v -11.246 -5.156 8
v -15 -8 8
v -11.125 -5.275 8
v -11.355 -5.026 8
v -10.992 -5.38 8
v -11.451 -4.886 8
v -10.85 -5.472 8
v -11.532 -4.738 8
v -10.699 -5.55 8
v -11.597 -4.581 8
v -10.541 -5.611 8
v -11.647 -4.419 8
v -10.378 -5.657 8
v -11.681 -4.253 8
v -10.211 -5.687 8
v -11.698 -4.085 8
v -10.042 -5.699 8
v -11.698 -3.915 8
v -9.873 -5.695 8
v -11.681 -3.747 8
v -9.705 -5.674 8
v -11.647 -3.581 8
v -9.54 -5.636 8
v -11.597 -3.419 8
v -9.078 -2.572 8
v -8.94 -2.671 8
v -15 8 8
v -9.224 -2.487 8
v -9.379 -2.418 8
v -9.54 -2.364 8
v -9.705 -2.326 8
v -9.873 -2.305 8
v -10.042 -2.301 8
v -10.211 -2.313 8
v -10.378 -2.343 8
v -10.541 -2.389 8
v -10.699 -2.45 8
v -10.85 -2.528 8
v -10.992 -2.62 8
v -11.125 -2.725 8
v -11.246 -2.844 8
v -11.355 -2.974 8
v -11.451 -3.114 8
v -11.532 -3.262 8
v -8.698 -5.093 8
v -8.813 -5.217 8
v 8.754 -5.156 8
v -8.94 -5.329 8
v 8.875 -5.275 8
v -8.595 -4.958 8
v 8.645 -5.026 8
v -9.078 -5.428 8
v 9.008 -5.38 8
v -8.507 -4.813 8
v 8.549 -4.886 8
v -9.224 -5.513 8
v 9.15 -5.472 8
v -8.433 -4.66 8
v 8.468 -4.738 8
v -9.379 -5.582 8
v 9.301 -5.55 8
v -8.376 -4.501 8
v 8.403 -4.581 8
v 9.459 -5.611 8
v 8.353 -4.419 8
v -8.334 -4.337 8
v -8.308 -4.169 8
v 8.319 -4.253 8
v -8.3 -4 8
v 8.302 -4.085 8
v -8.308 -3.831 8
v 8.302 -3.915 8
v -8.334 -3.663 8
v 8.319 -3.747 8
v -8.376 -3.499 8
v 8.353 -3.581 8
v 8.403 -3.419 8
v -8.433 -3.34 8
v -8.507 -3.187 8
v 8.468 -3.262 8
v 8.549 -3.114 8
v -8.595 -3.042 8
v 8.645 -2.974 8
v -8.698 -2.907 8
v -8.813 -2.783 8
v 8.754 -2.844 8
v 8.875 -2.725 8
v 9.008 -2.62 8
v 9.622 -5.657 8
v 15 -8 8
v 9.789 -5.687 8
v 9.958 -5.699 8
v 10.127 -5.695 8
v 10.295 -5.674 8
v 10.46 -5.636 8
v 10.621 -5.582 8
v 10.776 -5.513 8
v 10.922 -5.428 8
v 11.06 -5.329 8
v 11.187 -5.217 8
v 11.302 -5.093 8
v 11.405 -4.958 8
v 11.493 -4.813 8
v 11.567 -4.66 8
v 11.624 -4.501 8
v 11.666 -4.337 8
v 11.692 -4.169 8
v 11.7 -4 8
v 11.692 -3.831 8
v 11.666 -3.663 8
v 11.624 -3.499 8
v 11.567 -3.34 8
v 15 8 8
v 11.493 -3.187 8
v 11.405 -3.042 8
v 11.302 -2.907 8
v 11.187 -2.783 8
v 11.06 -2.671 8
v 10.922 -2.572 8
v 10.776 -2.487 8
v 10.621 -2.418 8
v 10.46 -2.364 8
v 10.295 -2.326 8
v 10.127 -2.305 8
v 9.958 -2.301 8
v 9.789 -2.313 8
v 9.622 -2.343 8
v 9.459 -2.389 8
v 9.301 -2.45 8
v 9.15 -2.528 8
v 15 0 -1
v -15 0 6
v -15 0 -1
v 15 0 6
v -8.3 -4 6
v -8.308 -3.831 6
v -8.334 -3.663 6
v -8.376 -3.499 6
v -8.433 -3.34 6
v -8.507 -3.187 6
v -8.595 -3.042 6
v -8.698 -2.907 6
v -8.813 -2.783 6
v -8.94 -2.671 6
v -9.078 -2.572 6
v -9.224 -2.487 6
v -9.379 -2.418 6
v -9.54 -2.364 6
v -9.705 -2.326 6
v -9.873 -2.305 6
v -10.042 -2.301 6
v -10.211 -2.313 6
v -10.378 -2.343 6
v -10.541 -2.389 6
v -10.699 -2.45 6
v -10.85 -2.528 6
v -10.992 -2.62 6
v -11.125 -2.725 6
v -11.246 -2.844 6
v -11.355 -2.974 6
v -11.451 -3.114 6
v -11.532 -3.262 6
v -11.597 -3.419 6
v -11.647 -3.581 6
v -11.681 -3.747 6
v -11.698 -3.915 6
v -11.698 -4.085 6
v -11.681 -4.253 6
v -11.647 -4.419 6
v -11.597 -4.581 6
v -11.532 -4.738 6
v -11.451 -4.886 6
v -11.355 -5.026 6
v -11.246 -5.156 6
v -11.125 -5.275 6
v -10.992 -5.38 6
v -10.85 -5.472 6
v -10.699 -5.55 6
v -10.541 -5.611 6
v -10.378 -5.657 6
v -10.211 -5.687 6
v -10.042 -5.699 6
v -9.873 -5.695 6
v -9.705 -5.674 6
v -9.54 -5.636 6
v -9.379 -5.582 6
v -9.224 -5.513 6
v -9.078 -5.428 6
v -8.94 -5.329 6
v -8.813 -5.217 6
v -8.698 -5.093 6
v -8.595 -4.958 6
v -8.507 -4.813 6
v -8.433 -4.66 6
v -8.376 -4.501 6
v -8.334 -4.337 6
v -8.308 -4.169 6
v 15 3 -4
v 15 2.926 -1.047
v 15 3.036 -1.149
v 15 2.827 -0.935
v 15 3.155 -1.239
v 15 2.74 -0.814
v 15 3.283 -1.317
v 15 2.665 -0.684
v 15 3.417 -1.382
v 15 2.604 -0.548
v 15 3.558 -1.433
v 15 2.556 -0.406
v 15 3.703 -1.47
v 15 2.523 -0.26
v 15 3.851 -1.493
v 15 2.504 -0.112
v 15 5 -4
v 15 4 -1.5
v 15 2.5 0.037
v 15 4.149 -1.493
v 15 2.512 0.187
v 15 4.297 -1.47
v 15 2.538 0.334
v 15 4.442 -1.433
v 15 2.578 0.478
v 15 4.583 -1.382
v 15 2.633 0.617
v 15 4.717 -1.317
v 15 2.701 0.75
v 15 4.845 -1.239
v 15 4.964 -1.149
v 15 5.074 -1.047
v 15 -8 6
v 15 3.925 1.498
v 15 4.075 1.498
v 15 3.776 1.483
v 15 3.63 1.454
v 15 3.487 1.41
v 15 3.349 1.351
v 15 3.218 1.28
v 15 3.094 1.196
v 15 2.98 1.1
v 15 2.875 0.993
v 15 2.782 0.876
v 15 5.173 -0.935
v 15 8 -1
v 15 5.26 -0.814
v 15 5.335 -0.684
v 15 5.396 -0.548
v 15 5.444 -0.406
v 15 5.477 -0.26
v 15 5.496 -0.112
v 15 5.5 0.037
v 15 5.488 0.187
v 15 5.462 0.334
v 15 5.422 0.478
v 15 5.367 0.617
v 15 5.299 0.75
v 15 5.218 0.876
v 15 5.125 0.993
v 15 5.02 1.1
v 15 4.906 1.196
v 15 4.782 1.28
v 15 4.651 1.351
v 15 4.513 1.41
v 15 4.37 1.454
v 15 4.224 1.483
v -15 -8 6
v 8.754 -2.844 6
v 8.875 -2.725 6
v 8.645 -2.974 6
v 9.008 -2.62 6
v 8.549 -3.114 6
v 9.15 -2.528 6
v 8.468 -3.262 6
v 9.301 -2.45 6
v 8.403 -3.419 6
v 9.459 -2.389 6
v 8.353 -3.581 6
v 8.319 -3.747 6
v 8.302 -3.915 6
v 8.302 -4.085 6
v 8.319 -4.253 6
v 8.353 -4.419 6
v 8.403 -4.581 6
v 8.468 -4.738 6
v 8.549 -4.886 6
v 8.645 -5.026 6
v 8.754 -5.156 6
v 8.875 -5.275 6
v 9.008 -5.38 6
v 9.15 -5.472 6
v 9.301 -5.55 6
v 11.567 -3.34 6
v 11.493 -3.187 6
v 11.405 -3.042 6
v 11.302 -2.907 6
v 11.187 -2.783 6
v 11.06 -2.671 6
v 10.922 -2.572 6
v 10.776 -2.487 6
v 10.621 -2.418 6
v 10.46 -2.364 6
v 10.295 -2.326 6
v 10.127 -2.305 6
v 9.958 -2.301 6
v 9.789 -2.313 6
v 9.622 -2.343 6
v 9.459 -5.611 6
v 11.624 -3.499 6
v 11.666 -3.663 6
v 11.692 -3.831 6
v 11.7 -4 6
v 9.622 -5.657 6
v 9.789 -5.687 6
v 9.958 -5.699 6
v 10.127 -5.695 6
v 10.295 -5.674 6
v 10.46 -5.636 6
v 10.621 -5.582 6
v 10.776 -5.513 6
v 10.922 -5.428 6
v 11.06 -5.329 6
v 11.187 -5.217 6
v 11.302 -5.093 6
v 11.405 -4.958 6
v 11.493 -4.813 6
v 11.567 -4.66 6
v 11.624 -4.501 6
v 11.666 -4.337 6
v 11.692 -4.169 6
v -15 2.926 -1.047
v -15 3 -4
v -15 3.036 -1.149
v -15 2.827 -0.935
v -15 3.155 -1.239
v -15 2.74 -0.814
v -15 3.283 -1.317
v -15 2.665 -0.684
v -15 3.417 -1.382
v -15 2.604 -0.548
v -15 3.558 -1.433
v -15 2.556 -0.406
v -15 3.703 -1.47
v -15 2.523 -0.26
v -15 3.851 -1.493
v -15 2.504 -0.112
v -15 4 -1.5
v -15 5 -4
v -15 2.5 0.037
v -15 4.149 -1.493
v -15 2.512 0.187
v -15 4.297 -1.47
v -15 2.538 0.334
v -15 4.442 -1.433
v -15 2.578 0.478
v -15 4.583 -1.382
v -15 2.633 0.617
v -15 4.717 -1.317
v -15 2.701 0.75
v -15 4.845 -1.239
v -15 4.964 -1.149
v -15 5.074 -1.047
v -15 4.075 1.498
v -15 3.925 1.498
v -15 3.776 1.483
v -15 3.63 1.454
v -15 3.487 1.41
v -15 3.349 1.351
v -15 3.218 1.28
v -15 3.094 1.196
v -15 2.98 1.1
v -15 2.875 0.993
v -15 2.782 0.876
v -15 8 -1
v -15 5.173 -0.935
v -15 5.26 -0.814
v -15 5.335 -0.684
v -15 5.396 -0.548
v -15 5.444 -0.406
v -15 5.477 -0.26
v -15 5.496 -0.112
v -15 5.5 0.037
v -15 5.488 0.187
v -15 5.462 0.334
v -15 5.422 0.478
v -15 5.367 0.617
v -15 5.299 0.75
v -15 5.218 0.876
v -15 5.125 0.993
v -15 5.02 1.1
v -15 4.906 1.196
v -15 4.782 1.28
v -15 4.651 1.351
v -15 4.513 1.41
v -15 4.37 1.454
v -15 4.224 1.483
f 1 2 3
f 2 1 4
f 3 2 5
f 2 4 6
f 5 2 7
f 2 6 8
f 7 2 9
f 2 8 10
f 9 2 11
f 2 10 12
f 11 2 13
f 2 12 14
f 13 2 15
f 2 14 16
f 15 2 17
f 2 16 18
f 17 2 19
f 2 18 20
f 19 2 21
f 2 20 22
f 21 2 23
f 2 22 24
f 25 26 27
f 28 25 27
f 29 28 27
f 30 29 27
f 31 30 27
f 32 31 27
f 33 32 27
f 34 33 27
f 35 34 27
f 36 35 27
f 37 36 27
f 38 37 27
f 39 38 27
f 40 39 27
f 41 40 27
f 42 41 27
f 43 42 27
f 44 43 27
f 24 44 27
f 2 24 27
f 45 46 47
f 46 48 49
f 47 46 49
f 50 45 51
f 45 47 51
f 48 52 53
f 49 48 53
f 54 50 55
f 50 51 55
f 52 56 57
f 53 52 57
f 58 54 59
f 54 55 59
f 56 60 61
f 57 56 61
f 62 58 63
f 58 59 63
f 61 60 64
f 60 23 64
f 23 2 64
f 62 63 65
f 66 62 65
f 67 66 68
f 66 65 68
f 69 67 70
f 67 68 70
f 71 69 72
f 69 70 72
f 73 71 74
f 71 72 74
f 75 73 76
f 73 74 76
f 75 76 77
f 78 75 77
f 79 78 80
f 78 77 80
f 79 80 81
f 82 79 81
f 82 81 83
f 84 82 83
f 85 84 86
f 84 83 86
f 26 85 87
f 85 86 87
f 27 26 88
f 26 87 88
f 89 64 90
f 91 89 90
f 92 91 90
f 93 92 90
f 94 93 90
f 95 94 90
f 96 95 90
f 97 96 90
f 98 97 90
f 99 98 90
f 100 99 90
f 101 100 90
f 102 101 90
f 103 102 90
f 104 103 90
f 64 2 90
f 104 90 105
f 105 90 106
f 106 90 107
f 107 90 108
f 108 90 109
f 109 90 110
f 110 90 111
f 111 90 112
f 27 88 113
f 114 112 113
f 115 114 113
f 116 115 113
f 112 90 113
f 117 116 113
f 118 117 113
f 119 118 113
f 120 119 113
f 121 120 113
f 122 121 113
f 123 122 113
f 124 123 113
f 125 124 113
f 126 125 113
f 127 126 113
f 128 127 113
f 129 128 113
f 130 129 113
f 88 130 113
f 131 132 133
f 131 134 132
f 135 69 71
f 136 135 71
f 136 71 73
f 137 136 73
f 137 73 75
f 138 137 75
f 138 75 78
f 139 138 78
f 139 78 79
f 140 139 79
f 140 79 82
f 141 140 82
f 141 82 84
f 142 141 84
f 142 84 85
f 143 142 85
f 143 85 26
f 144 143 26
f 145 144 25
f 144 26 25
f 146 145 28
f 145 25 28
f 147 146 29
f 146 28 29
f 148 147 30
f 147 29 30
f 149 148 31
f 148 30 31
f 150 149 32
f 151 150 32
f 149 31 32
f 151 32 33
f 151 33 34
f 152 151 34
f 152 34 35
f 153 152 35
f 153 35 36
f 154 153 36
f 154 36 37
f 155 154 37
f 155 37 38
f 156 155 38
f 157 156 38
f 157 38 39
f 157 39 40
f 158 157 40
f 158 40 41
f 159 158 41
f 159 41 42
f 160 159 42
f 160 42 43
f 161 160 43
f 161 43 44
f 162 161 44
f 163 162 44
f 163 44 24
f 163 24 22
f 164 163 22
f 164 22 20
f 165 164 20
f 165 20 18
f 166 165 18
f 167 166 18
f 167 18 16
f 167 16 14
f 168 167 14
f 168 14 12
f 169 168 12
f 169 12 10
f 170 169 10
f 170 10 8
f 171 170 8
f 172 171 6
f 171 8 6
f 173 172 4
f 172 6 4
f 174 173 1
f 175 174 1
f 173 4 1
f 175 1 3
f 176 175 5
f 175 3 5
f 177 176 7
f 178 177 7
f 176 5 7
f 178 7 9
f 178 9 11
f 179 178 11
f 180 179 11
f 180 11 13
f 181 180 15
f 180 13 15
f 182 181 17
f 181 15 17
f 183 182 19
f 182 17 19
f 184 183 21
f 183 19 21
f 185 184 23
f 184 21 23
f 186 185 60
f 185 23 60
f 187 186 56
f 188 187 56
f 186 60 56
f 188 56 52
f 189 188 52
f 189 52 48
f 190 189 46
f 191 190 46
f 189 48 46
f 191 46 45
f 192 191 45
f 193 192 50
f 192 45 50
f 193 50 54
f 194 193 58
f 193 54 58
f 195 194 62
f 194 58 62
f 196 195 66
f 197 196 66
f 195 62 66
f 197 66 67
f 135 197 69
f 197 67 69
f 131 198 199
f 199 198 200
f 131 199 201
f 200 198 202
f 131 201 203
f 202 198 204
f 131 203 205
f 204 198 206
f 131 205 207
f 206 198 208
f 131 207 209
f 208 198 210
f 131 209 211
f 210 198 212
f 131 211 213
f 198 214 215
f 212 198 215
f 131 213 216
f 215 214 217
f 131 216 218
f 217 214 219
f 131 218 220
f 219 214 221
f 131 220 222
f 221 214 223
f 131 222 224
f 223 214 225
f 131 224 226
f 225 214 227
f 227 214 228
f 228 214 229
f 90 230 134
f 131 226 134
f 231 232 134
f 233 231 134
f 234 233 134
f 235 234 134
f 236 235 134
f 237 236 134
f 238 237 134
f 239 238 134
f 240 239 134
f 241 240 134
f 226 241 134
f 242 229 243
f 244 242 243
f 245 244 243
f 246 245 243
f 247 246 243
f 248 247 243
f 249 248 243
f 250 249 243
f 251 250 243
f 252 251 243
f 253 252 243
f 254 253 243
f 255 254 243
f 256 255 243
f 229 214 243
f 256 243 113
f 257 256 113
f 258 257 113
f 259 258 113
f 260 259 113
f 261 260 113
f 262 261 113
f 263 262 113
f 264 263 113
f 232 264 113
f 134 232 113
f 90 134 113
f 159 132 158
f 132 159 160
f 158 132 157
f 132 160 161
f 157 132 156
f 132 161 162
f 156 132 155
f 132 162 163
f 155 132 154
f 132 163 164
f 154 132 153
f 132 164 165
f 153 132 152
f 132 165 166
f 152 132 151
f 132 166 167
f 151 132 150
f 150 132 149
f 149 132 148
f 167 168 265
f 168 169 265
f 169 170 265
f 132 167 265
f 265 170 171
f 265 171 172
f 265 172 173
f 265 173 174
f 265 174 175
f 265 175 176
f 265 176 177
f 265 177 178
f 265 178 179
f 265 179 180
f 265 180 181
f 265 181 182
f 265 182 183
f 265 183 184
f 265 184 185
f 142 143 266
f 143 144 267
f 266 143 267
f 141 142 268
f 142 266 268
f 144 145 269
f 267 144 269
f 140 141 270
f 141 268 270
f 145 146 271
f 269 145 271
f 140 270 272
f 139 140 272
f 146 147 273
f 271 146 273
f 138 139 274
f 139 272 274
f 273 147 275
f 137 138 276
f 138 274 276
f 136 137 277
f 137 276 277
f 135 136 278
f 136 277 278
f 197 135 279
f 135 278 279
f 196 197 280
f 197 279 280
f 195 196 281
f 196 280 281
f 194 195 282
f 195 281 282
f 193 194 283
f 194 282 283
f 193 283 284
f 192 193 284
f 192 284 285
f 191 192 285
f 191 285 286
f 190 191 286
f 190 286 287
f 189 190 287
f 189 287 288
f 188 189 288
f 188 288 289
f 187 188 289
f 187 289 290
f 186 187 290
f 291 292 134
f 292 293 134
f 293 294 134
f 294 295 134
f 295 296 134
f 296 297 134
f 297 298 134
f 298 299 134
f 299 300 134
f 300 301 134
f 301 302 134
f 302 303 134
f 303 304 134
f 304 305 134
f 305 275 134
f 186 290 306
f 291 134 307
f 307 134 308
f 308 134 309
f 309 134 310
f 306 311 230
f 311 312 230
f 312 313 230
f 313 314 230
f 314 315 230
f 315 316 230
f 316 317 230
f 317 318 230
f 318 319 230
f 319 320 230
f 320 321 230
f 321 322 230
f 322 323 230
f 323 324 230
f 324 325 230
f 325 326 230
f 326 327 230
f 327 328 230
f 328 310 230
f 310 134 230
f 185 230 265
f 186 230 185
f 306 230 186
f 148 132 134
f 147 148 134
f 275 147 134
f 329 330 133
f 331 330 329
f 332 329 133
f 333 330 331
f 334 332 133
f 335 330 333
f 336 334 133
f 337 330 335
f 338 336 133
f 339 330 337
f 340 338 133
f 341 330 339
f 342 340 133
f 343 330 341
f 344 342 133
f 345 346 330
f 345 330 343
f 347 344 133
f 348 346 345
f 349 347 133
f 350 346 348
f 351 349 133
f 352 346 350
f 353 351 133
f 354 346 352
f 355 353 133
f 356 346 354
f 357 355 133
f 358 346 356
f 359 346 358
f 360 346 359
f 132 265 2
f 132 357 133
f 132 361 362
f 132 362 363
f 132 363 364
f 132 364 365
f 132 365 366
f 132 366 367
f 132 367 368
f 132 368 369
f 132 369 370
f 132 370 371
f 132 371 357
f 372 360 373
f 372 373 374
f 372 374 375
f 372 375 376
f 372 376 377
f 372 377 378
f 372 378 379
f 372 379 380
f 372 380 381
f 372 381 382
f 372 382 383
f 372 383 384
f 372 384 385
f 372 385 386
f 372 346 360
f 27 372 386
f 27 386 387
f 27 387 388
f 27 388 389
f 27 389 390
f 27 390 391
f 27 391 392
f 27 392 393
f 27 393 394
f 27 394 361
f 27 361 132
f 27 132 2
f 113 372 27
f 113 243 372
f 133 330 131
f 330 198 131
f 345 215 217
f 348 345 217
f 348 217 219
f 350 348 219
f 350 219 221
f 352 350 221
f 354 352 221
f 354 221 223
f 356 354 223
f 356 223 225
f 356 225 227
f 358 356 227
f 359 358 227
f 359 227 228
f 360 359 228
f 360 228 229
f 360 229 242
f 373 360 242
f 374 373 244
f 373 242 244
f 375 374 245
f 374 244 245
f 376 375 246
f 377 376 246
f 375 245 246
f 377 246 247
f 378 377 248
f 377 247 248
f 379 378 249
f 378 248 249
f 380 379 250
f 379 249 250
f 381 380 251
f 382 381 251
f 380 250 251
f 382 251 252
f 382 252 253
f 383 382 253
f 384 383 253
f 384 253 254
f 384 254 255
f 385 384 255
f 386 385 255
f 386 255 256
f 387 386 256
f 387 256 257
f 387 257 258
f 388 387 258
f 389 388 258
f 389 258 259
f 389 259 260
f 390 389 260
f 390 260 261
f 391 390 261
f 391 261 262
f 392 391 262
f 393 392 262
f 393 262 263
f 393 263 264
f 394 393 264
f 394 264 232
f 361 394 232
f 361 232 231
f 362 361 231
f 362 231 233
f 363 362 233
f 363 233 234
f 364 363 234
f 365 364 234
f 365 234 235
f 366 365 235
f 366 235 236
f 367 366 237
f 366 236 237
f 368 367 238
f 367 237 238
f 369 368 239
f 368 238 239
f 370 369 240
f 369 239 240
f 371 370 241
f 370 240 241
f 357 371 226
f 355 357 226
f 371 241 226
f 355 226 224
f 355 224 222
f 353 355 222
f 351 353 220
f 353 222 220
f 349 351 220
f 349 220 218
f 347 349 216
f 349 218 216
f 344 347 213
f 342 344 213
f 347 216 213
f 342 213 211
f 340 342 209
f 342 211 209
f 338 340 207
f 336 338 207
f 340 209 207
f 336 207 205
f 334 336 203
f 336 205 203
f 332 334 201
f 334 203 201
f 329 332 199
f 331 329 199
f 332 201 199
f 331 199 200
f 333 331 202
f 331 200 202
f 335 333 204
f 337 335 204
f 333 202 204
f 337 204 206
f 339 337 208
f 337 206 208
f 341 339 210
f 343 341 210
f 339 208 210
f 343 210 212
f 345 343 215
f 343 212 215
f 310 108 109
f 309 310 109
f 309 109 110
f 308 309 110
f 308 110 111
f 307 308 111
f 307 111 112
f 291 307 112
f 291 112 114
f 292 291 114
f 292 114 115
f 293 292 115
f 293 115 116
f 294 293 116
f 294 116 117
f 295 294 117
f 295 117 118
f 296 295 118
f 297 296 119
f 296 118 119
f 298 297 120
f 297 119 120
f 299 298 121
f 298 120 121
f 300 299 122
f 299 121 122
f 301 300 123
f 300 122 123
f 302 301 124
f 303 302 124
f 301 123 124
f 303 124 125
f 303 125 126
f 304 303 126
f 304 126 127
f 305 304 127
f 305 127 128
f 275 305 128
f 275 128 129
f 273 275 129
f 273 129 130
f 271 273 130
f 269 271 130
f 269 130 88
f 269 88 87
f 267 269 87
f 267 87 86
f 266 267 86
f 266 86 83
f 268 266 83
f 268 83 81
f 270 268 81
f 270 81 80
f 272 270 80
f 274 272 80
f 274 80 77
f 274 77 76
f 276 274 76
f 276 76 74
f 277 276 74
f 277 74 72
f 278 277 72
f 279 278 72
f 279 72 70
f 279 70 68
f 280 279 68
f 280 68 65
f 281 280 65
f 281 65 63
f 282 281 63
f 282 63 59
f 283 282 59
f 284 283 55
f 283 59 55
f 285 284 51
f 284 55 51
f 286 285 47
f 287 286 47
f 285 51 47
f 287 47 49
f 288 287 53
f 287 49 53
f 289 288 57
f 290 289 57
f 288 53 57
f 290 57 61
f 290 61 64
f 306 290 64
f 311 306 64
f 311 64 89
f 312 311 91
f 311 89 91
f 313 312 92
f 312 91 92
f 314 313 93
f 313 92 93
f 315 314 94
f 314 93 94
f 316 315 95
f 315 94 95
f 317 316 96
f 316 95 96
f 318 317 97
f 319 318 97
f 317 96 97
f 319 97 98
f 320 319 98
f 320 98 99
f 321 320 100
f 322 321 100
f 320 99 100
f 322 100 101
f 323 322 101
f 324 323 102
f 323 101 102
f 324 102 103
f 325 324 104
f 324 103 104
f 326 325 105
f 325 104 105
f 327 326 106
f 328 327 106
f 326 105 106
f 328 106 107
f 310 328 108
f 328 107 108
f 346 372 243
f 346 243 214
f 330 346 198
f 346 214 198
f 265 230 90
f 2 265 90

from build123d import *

# Parameters (mm, degrees)
BOSS_EXTRUDE1_DEPTH     = 15
M3_CLEARANCE_HOLE1_D    = 3.4
SKETCH4_R               = 1.5
CUT_EXTRUDE1_DEPTH      = 1
CUT_EXTRUDE1_DEPTH_BACK = 31


with BuildPart() as part:
    # Sketch1 → Boss-Extrude1 (new body, symmetric)
    with BuildSketch(Plane(origin=(0, 0, 0), x_dir=(0, 0, -1), z_dir=(1, 0, 0))):
        Polygon((-8, 8), (0, 8), (1, 8), (4, 5), (4, 3), (1, 0), (0, 0), (-6, 0), (-6, -8), (-8, -8), align=None)
    extrude(amount=BOSS_EXTRUDE1_DEPTH, both=True)

    # M3 Clearance Hole1 (through all)
    with Locations(Plane(origin=(0, 0, 6), x_dir=(-1, 0, 0), z_dir=(0, 0, -1))):
        with Locations((-10, -4), (10, -4)):
            Hole(M3_CLEARANCE_HOLE1_D / 2)

    # Sketch4 → Cut-Extrude1 (cut, two sides)
    with BuildSketch(Plane(origin=(15, 0, 0), x_dir=(0, 0, -1), z_dir=(1, 0, 0))) as cut_extrude1_sk:
        with Locations((0, 4)):
            Circle(SKETCH4_R)
    extrude(amount=CUT_EXTRUDE1_DEPTH, mode=Mode.SUBTRACT)
    extrude(cut_extrude1_sk.sketch, amount=-CUT_EXTRUDE1_DEPTH_BACK, mode=Mode.SUBTRACT)


solid = part.part
